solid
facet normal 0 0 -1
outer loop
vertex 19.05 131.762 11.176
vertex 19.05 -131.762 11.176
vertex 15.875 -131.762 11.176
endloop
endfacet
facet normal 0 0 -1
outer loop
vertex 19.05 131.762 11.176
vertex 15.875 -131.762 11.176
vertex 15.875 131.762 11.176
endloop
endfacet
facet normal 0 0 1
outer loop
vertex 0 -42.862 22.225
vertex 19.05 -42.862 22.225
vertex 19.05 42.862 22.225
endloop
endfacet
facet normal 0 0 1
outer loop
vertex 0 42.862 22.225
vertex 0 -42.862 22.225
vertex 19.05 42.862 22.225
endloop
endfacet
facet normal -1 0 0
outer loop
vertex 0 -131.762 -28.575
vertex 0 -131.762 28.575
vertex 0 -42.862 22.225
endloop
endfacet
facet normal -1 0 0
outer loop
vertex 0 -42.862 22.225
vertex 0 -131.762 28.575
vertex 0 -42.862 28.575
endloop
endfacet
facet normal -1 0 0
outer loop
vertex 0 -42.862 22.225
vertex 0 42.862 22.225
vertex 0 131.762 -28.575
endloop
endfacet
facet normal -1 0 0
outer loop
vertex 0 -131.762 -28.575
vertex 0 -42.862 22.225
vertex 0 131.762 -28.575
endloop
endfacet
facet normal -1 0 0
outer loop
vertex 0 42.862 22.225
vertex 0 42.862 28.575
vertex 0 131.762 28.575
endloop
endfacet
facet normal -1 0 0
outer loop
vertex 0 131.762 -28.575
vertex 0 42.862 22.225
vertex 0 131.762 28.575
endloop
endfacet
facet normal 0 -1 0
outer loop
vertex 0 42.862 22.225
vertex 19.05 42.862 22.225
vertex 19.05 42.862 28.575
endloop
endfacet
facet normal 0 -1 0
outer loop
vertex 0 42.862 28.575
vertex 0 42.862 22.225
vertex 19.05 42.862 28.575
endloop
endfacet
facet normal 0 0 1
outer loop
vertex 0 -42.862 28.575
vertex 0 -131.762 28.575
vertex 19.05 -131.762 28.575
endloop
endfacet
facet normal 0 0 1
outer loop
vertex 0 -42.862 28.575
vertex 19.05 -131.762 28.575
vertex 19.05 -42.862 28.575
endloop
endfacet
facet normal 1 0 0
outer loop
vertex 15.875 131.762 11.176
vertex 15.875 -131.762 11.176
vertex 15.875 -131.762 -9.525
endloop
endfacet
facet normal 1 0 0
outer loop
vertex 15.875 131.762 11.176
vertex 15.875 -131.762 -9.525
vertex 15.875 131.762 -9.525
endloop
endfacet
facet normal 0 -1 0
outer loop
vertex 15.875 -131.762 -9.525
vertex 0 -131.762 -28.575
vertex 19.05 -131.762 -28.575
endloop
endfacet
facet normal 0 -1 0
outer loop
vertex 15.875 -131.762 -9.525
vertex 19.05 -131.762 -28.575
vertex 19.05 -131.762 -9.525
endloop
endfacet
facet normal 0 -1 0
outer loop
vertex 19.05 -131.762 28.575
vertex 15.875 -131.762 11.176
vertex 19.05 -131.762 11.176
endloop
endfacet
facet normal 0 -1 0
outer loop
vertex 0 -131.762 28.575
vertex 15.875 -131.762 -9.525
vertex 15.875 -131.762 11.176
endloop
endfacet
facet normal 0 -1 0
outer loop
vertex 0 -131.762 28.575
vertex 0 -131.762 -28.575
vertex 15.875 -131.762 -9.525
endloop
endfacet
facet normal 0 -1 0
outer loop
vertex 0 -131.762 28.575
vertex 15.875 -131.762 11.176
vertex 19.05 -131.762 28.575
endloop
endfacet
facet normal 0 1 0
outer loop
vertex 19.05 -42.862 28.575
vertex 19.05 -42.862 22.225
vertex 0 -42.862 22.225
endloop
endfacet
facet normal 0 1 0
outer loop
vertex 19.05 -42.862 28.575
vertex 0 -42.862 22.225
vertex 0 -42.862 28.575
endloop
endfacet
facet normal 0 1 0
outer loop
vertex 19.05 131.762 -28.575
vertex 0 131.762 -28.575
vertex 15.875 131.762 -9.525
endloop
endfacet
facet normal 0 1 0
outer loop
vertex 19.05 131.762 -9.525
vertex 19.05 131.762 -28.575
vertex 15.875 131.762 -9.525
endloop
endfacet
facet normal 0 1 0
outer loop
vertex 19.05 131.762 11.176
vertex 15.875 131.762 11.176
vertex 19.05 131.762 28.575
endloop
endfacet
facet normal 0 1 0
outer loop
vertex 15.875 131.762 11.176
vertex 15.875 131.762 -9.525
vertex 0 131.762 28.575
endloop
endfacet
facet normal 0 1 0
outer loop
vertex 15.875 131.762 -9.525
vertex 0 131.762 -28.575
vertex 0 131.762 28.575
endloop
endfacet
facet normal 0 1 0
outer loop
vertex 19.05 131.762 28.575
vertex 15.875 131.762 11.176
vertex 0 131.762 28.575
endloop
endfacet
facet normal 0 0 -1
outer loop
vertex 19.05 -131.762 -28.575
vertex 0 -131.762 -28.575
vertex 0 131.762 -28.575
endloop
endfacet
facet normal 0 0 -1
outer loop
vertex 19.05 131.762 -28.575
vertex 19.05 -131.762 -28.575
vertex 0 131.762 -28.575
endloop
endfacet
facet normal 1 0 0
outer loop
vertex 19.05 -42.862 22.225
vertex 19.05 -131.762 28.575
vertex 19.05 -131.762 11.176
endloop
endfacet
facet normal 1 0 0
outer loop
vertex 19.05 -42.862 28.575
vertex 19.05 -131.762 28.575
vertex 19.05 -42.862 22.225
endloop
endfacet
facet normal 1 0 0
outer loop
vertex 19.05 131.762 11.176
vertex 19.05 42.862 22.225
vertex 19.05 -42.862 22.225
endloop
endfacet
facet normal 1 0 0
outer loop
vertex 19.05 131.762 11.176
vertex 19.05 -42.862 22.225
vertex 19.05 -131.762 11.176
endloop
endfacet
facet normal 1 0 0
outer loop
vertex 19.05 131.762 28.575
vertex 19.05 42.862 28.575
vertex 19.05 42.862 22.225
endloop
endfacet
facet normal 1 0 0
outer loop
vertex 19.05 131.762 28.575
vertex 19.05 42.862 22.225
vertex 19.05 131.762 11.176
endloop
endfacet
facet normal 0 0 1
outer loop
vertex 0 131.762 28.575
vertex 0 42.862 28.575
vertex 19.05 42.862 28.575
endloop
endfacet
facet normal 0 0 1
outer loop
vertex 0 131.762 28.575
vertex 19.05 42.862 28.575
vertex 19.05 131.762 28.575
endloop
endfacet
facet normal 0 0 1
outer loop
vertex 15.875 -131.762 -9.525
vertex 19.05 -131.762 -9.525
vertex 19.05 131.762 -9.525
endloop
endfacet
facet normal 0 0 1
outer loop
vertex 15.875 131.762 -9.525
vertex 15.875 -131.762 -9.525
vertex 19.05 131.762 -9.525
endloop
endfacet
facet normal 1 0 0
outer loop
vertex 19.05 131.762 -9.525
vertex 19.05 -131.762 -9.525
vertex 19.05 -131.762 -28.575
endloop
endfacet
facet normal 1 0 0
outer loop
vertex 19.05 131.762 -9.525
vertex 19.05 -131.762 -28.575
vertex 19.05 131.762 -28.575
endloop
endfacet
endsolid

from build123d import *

# Parameters (mm, degrees)
F0_W     = 263.525
F0_H     = 57.15
F1_DEPTH = 19.05
F2_W     = 263.525
F2_H     = 20.701
F3_DEPTH = 3.175
F4_W     = 85.725
F4_H     = 6.35
F5_DEPTH = 19.05


with BuildPart() as f1:
    # F0 (on Right) → F1 (new body)
    with BuildSketch(Plane.YZ):
        Rectangle(F0_W, F0_H)
    extrude(amount=F1_DEPTH)

    # F2 (on face) → F3 (cut)
    with BuildSketch(Plane.YZ.offset(19.05)):
        with Locations((0, 0.8255)):
            Rectangle(F2_W, F2_H)
    extrude(amount=-F3_DEPTH, mode=Mode.SUBTRACT)

    # F4 (on face) → F5 (cut, through all)
    with BuildSketch(Plane.YZ.offset(19.05)):
        with Locations((0, 25.4)):
            Rectangle(F4_W, F4_H)
    extrude(amount=-F5_DEPTH, mode=Mode.SUBTRACT)


solid = f1.part
